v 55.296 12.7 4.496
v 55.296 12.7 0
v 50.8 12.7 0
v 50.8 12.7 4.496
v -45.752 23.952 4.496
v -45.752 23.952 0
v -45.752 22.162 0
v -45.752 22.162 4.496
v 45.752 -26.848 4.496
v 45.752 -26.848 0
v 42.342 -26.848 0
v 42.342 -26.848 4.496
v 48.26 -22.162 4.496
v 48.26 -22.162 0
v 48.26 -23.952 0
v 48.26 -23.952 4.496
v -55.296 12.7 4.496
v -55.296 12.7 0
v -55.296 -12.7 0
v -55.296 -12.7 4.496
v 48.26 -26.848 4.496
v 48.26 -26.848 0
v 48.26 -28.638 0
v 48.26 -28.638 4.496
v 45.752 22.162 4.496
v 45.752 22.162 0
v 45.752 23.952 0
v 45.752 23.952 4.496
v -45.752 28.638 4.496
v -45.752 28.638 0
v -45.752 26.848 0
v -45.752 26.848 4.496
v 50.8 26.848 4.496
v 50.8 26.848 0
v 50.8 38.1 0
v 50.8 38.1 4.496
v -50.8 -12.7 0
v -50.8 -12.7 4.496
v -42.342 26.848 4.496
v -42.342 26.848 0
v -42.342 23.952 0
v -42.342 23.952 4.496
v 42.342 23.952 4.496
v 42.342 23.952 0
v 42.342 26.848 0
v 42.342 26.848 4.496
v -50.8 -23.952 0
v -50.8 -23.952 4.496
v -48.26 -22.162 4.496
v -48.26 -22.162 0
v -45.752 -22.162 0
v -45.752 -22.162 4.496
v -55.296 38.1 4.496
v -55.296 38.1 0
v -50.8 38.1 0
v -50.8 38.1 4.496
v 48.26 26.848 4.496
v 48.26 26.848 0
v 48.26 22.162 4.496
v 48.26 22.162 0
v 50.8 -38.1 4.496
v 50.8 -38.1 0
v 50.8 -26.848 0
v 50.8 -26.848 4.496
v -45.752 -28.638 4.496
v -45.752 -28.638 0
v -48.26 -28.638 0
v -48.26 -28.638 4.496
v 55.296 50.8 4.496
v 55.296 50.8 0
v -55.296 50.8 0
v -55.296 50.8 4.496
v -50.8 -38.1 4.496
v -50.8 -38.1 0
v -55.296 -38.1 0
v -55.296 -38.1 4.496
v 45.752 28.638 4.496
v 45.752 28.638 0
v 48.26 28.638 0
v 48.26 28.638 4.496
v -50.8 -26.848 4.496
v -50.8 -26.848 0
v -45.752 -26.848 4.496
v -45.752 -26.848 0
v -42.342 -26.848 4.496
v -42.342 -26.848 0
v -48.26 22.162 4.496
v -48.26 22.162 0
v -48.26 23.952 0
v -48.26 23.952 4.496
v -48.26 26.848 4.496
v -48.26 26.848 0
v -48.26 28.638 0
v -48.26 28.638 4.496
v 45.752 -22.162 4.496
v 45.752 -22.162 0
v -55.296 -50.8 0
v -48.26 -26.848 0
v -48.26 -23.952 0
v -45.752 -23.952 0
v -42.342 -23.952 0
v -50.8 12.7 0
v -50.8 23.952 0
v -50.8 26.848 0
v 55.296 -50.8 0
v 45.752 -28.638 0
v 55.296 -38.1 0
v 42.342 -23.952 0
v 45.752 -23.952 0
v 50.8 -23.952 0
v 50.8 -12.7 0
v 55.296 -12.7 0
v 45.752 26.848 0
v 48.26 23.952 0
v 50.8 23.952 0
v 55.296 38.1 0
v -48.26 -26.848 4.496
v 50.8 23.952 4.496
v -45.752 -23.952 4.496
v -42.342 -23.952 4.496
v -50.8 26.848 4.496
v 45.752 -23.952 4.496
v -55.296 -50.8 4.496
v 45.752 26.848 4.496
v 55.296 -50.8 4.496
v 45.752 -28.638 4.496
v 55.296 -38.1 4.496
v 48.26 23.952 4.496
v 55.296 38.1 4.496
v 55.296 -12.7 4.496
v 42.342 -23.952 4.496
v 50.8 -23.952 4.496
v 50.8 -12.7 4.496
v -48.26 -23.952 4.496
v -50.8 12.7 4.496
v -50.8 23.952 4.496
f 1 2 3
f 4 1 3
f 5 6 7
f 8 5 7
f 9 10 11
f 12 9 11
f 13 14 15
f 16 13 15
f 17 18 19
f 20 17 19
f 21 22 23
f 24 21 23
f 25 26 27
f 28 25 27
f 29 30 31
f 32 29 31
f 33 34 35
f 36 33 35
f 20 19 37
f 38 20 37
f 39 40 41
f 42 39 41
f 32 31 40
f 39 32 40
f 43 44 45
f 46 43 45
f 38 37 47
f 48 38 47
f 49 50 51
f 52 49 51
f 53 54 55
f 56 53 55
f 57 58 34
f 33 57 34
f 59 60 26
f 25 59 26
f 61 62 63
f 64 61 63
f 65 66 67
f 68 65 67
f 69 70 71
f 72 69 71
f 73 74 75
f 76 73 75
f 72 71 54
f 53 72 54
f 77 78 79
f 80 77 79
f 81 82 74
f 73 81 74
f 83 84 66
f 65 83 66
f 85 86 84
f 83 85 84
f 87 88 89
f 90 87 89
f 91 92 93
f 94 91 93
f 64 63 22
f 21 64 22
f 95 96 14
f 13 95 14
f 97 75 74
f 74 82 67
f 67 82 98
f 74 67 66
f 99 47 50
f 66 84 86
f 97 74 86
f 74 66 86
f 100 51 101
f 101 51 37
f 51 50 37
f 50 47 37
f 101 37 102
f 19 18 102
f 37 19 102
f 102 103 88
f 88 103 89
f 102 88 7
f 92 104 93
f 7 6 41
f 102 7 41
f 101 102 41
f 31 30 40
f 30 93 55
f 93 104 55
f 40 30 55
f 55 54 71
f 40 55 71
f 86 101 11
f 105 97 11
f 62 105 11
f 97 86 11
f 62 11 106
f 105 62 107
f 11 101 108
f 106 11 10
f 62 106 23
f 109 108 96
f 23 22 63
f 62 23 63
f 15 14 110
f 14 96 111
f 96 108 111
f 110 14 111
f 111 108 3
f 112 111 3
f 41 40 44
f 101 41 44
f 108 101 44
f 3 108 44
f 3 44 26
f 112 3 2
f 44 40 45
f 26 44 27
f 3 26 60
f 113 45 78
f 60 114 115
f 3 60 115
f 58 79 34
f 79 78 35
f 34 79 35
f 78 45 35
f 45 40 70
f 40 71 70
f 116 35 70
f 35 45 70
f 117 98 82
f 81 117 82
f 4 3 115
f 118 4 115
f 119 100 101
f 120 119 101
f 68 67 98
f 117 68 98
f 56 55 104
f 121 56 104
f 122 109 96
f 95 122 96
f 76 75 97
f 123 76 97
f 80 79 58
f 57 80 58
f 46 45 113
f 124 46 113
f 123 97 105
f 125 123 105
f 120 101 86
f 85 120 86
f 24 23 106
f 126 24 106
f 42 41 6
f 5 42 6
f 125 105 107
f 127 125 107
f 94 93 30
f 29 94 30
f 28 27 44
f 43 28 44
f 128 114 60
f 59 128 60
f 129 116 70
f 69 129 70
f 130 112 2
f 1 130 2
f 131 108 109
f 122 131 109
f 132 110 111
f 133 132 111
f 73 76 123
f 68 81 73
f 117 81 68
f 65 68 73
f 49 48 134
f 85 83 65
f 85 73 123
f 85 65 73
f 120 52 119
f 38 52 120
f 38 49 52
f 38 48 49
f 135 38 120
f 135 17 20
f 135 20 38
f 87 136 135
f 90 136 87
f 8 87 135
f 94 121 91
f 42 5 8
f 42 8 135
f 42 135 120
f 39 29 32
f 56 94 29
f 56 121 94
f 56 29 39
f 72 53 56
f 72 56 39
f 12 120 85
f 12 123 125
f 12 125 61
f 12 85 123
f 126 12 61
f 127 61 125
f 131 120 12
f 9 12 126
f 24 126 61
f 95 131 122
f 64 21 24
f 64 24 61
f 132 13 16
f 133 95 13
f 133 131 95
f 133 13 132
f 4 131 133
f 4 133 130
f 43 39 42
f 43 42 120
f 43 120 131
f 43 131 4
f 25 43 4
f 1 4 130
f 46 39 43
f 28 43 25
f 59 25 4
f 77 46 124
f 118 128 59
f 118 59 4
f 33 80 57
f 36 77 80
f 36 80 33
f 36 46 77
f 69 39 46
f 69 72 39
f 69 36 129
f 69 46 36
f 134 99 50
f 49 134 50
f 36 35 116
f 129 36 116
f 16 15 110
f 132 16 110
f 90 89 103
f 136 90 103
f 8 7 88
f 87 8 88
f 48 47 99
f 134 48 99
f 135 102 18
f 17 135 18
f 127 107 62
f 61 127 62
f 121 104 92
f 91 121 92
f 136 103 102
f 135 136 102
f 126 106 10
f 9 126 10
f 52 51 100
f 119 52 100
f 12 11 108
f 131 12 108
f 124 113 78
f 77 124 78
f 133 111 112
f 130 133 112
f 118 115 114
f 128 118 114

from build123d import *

# Parameters (mm, degrees)
F1_DEPTH = 4.4958


with BuildPart() as f1:
    # F0 (on Top) → F1 (new body)
    with BuildSketch(Plane.XY):
        Polygon((50.8, 50.8), (-50.8, 50.8), (-55.2958, 50.8), (-55.2958, 38.1), (-50.8, 38.1), (-50.8, 26.8478), (-48.26, 26.8478), (-48.26, 28.6385), (-45.75175, 28.6385), (-45.75175, 26.8478), (-42.3418, 26.8478), (-42.3418, 23.9522), (-45.75175, 23.9522), (-45.75175, 22.1615), (-48.26, 22.1615), (-48.26, 23.9522), (-50.8, 23.9522), (-50.8, 12.7), (-55.2958, 12.7), (-55.2958, 0), (-55.2958, -12.7), (-50.8, -12.7), (-50.8, -23.9522), (-48.26, -23.9522), (-48.26, -22.1615), (-45.75175, -22.1615), (-45.75175, -23.9522), (-42.3418, -23.9522), (-42.3418, -26.8478), (-45.75175, -26.8478), (-45.75175, -28.6385), (-48.26, -28.6385), (-48.26, -26.8478), (-50.8, -26.8478), (-50.8, -38.1), (-55.2958, -38.1), (-55.2958, -50.8), (-50.8, -50.8), (50.8, -50.8), (55.2958, -50.8), (55.2958, -38.1), (50.8, -38.1), (50.8, -26.8478), (48.26, -26.8478), (48.26, -28.6385), (45.75175, -28.6385), (45.75175, -26.8478), (42.3418, -26.8478), (42.3418, -23.9522), (45.75175, -23.9522), (45.75175, -22.1615), (48.26, -22.1615), (48.26, -23.9522), (50.8, -23.9522), (50.8, -12.7), (55.2958, -12.7), (55.2958, 0), (55.2958, 12.7), (50.8, 12.7), (50.8, 23.9522), (48.26, 23.9522), (48.26, 22.1615), (45.75175, 22.1615), (45.75175, 23.9522), (42.3418, 23.9522), (42.3418, 26.8478), (45.75175, 26.8478), (45.75175, 28.6385), (48.26, 28.6385), (48.26, 26.8478), (50.8, 26.8478), (50.8, 38.1), (55.2958, 38.1), (55.2958, 50.8), align=None)
    extrude(amount=F1_DEPTH)


solid = f1.part
